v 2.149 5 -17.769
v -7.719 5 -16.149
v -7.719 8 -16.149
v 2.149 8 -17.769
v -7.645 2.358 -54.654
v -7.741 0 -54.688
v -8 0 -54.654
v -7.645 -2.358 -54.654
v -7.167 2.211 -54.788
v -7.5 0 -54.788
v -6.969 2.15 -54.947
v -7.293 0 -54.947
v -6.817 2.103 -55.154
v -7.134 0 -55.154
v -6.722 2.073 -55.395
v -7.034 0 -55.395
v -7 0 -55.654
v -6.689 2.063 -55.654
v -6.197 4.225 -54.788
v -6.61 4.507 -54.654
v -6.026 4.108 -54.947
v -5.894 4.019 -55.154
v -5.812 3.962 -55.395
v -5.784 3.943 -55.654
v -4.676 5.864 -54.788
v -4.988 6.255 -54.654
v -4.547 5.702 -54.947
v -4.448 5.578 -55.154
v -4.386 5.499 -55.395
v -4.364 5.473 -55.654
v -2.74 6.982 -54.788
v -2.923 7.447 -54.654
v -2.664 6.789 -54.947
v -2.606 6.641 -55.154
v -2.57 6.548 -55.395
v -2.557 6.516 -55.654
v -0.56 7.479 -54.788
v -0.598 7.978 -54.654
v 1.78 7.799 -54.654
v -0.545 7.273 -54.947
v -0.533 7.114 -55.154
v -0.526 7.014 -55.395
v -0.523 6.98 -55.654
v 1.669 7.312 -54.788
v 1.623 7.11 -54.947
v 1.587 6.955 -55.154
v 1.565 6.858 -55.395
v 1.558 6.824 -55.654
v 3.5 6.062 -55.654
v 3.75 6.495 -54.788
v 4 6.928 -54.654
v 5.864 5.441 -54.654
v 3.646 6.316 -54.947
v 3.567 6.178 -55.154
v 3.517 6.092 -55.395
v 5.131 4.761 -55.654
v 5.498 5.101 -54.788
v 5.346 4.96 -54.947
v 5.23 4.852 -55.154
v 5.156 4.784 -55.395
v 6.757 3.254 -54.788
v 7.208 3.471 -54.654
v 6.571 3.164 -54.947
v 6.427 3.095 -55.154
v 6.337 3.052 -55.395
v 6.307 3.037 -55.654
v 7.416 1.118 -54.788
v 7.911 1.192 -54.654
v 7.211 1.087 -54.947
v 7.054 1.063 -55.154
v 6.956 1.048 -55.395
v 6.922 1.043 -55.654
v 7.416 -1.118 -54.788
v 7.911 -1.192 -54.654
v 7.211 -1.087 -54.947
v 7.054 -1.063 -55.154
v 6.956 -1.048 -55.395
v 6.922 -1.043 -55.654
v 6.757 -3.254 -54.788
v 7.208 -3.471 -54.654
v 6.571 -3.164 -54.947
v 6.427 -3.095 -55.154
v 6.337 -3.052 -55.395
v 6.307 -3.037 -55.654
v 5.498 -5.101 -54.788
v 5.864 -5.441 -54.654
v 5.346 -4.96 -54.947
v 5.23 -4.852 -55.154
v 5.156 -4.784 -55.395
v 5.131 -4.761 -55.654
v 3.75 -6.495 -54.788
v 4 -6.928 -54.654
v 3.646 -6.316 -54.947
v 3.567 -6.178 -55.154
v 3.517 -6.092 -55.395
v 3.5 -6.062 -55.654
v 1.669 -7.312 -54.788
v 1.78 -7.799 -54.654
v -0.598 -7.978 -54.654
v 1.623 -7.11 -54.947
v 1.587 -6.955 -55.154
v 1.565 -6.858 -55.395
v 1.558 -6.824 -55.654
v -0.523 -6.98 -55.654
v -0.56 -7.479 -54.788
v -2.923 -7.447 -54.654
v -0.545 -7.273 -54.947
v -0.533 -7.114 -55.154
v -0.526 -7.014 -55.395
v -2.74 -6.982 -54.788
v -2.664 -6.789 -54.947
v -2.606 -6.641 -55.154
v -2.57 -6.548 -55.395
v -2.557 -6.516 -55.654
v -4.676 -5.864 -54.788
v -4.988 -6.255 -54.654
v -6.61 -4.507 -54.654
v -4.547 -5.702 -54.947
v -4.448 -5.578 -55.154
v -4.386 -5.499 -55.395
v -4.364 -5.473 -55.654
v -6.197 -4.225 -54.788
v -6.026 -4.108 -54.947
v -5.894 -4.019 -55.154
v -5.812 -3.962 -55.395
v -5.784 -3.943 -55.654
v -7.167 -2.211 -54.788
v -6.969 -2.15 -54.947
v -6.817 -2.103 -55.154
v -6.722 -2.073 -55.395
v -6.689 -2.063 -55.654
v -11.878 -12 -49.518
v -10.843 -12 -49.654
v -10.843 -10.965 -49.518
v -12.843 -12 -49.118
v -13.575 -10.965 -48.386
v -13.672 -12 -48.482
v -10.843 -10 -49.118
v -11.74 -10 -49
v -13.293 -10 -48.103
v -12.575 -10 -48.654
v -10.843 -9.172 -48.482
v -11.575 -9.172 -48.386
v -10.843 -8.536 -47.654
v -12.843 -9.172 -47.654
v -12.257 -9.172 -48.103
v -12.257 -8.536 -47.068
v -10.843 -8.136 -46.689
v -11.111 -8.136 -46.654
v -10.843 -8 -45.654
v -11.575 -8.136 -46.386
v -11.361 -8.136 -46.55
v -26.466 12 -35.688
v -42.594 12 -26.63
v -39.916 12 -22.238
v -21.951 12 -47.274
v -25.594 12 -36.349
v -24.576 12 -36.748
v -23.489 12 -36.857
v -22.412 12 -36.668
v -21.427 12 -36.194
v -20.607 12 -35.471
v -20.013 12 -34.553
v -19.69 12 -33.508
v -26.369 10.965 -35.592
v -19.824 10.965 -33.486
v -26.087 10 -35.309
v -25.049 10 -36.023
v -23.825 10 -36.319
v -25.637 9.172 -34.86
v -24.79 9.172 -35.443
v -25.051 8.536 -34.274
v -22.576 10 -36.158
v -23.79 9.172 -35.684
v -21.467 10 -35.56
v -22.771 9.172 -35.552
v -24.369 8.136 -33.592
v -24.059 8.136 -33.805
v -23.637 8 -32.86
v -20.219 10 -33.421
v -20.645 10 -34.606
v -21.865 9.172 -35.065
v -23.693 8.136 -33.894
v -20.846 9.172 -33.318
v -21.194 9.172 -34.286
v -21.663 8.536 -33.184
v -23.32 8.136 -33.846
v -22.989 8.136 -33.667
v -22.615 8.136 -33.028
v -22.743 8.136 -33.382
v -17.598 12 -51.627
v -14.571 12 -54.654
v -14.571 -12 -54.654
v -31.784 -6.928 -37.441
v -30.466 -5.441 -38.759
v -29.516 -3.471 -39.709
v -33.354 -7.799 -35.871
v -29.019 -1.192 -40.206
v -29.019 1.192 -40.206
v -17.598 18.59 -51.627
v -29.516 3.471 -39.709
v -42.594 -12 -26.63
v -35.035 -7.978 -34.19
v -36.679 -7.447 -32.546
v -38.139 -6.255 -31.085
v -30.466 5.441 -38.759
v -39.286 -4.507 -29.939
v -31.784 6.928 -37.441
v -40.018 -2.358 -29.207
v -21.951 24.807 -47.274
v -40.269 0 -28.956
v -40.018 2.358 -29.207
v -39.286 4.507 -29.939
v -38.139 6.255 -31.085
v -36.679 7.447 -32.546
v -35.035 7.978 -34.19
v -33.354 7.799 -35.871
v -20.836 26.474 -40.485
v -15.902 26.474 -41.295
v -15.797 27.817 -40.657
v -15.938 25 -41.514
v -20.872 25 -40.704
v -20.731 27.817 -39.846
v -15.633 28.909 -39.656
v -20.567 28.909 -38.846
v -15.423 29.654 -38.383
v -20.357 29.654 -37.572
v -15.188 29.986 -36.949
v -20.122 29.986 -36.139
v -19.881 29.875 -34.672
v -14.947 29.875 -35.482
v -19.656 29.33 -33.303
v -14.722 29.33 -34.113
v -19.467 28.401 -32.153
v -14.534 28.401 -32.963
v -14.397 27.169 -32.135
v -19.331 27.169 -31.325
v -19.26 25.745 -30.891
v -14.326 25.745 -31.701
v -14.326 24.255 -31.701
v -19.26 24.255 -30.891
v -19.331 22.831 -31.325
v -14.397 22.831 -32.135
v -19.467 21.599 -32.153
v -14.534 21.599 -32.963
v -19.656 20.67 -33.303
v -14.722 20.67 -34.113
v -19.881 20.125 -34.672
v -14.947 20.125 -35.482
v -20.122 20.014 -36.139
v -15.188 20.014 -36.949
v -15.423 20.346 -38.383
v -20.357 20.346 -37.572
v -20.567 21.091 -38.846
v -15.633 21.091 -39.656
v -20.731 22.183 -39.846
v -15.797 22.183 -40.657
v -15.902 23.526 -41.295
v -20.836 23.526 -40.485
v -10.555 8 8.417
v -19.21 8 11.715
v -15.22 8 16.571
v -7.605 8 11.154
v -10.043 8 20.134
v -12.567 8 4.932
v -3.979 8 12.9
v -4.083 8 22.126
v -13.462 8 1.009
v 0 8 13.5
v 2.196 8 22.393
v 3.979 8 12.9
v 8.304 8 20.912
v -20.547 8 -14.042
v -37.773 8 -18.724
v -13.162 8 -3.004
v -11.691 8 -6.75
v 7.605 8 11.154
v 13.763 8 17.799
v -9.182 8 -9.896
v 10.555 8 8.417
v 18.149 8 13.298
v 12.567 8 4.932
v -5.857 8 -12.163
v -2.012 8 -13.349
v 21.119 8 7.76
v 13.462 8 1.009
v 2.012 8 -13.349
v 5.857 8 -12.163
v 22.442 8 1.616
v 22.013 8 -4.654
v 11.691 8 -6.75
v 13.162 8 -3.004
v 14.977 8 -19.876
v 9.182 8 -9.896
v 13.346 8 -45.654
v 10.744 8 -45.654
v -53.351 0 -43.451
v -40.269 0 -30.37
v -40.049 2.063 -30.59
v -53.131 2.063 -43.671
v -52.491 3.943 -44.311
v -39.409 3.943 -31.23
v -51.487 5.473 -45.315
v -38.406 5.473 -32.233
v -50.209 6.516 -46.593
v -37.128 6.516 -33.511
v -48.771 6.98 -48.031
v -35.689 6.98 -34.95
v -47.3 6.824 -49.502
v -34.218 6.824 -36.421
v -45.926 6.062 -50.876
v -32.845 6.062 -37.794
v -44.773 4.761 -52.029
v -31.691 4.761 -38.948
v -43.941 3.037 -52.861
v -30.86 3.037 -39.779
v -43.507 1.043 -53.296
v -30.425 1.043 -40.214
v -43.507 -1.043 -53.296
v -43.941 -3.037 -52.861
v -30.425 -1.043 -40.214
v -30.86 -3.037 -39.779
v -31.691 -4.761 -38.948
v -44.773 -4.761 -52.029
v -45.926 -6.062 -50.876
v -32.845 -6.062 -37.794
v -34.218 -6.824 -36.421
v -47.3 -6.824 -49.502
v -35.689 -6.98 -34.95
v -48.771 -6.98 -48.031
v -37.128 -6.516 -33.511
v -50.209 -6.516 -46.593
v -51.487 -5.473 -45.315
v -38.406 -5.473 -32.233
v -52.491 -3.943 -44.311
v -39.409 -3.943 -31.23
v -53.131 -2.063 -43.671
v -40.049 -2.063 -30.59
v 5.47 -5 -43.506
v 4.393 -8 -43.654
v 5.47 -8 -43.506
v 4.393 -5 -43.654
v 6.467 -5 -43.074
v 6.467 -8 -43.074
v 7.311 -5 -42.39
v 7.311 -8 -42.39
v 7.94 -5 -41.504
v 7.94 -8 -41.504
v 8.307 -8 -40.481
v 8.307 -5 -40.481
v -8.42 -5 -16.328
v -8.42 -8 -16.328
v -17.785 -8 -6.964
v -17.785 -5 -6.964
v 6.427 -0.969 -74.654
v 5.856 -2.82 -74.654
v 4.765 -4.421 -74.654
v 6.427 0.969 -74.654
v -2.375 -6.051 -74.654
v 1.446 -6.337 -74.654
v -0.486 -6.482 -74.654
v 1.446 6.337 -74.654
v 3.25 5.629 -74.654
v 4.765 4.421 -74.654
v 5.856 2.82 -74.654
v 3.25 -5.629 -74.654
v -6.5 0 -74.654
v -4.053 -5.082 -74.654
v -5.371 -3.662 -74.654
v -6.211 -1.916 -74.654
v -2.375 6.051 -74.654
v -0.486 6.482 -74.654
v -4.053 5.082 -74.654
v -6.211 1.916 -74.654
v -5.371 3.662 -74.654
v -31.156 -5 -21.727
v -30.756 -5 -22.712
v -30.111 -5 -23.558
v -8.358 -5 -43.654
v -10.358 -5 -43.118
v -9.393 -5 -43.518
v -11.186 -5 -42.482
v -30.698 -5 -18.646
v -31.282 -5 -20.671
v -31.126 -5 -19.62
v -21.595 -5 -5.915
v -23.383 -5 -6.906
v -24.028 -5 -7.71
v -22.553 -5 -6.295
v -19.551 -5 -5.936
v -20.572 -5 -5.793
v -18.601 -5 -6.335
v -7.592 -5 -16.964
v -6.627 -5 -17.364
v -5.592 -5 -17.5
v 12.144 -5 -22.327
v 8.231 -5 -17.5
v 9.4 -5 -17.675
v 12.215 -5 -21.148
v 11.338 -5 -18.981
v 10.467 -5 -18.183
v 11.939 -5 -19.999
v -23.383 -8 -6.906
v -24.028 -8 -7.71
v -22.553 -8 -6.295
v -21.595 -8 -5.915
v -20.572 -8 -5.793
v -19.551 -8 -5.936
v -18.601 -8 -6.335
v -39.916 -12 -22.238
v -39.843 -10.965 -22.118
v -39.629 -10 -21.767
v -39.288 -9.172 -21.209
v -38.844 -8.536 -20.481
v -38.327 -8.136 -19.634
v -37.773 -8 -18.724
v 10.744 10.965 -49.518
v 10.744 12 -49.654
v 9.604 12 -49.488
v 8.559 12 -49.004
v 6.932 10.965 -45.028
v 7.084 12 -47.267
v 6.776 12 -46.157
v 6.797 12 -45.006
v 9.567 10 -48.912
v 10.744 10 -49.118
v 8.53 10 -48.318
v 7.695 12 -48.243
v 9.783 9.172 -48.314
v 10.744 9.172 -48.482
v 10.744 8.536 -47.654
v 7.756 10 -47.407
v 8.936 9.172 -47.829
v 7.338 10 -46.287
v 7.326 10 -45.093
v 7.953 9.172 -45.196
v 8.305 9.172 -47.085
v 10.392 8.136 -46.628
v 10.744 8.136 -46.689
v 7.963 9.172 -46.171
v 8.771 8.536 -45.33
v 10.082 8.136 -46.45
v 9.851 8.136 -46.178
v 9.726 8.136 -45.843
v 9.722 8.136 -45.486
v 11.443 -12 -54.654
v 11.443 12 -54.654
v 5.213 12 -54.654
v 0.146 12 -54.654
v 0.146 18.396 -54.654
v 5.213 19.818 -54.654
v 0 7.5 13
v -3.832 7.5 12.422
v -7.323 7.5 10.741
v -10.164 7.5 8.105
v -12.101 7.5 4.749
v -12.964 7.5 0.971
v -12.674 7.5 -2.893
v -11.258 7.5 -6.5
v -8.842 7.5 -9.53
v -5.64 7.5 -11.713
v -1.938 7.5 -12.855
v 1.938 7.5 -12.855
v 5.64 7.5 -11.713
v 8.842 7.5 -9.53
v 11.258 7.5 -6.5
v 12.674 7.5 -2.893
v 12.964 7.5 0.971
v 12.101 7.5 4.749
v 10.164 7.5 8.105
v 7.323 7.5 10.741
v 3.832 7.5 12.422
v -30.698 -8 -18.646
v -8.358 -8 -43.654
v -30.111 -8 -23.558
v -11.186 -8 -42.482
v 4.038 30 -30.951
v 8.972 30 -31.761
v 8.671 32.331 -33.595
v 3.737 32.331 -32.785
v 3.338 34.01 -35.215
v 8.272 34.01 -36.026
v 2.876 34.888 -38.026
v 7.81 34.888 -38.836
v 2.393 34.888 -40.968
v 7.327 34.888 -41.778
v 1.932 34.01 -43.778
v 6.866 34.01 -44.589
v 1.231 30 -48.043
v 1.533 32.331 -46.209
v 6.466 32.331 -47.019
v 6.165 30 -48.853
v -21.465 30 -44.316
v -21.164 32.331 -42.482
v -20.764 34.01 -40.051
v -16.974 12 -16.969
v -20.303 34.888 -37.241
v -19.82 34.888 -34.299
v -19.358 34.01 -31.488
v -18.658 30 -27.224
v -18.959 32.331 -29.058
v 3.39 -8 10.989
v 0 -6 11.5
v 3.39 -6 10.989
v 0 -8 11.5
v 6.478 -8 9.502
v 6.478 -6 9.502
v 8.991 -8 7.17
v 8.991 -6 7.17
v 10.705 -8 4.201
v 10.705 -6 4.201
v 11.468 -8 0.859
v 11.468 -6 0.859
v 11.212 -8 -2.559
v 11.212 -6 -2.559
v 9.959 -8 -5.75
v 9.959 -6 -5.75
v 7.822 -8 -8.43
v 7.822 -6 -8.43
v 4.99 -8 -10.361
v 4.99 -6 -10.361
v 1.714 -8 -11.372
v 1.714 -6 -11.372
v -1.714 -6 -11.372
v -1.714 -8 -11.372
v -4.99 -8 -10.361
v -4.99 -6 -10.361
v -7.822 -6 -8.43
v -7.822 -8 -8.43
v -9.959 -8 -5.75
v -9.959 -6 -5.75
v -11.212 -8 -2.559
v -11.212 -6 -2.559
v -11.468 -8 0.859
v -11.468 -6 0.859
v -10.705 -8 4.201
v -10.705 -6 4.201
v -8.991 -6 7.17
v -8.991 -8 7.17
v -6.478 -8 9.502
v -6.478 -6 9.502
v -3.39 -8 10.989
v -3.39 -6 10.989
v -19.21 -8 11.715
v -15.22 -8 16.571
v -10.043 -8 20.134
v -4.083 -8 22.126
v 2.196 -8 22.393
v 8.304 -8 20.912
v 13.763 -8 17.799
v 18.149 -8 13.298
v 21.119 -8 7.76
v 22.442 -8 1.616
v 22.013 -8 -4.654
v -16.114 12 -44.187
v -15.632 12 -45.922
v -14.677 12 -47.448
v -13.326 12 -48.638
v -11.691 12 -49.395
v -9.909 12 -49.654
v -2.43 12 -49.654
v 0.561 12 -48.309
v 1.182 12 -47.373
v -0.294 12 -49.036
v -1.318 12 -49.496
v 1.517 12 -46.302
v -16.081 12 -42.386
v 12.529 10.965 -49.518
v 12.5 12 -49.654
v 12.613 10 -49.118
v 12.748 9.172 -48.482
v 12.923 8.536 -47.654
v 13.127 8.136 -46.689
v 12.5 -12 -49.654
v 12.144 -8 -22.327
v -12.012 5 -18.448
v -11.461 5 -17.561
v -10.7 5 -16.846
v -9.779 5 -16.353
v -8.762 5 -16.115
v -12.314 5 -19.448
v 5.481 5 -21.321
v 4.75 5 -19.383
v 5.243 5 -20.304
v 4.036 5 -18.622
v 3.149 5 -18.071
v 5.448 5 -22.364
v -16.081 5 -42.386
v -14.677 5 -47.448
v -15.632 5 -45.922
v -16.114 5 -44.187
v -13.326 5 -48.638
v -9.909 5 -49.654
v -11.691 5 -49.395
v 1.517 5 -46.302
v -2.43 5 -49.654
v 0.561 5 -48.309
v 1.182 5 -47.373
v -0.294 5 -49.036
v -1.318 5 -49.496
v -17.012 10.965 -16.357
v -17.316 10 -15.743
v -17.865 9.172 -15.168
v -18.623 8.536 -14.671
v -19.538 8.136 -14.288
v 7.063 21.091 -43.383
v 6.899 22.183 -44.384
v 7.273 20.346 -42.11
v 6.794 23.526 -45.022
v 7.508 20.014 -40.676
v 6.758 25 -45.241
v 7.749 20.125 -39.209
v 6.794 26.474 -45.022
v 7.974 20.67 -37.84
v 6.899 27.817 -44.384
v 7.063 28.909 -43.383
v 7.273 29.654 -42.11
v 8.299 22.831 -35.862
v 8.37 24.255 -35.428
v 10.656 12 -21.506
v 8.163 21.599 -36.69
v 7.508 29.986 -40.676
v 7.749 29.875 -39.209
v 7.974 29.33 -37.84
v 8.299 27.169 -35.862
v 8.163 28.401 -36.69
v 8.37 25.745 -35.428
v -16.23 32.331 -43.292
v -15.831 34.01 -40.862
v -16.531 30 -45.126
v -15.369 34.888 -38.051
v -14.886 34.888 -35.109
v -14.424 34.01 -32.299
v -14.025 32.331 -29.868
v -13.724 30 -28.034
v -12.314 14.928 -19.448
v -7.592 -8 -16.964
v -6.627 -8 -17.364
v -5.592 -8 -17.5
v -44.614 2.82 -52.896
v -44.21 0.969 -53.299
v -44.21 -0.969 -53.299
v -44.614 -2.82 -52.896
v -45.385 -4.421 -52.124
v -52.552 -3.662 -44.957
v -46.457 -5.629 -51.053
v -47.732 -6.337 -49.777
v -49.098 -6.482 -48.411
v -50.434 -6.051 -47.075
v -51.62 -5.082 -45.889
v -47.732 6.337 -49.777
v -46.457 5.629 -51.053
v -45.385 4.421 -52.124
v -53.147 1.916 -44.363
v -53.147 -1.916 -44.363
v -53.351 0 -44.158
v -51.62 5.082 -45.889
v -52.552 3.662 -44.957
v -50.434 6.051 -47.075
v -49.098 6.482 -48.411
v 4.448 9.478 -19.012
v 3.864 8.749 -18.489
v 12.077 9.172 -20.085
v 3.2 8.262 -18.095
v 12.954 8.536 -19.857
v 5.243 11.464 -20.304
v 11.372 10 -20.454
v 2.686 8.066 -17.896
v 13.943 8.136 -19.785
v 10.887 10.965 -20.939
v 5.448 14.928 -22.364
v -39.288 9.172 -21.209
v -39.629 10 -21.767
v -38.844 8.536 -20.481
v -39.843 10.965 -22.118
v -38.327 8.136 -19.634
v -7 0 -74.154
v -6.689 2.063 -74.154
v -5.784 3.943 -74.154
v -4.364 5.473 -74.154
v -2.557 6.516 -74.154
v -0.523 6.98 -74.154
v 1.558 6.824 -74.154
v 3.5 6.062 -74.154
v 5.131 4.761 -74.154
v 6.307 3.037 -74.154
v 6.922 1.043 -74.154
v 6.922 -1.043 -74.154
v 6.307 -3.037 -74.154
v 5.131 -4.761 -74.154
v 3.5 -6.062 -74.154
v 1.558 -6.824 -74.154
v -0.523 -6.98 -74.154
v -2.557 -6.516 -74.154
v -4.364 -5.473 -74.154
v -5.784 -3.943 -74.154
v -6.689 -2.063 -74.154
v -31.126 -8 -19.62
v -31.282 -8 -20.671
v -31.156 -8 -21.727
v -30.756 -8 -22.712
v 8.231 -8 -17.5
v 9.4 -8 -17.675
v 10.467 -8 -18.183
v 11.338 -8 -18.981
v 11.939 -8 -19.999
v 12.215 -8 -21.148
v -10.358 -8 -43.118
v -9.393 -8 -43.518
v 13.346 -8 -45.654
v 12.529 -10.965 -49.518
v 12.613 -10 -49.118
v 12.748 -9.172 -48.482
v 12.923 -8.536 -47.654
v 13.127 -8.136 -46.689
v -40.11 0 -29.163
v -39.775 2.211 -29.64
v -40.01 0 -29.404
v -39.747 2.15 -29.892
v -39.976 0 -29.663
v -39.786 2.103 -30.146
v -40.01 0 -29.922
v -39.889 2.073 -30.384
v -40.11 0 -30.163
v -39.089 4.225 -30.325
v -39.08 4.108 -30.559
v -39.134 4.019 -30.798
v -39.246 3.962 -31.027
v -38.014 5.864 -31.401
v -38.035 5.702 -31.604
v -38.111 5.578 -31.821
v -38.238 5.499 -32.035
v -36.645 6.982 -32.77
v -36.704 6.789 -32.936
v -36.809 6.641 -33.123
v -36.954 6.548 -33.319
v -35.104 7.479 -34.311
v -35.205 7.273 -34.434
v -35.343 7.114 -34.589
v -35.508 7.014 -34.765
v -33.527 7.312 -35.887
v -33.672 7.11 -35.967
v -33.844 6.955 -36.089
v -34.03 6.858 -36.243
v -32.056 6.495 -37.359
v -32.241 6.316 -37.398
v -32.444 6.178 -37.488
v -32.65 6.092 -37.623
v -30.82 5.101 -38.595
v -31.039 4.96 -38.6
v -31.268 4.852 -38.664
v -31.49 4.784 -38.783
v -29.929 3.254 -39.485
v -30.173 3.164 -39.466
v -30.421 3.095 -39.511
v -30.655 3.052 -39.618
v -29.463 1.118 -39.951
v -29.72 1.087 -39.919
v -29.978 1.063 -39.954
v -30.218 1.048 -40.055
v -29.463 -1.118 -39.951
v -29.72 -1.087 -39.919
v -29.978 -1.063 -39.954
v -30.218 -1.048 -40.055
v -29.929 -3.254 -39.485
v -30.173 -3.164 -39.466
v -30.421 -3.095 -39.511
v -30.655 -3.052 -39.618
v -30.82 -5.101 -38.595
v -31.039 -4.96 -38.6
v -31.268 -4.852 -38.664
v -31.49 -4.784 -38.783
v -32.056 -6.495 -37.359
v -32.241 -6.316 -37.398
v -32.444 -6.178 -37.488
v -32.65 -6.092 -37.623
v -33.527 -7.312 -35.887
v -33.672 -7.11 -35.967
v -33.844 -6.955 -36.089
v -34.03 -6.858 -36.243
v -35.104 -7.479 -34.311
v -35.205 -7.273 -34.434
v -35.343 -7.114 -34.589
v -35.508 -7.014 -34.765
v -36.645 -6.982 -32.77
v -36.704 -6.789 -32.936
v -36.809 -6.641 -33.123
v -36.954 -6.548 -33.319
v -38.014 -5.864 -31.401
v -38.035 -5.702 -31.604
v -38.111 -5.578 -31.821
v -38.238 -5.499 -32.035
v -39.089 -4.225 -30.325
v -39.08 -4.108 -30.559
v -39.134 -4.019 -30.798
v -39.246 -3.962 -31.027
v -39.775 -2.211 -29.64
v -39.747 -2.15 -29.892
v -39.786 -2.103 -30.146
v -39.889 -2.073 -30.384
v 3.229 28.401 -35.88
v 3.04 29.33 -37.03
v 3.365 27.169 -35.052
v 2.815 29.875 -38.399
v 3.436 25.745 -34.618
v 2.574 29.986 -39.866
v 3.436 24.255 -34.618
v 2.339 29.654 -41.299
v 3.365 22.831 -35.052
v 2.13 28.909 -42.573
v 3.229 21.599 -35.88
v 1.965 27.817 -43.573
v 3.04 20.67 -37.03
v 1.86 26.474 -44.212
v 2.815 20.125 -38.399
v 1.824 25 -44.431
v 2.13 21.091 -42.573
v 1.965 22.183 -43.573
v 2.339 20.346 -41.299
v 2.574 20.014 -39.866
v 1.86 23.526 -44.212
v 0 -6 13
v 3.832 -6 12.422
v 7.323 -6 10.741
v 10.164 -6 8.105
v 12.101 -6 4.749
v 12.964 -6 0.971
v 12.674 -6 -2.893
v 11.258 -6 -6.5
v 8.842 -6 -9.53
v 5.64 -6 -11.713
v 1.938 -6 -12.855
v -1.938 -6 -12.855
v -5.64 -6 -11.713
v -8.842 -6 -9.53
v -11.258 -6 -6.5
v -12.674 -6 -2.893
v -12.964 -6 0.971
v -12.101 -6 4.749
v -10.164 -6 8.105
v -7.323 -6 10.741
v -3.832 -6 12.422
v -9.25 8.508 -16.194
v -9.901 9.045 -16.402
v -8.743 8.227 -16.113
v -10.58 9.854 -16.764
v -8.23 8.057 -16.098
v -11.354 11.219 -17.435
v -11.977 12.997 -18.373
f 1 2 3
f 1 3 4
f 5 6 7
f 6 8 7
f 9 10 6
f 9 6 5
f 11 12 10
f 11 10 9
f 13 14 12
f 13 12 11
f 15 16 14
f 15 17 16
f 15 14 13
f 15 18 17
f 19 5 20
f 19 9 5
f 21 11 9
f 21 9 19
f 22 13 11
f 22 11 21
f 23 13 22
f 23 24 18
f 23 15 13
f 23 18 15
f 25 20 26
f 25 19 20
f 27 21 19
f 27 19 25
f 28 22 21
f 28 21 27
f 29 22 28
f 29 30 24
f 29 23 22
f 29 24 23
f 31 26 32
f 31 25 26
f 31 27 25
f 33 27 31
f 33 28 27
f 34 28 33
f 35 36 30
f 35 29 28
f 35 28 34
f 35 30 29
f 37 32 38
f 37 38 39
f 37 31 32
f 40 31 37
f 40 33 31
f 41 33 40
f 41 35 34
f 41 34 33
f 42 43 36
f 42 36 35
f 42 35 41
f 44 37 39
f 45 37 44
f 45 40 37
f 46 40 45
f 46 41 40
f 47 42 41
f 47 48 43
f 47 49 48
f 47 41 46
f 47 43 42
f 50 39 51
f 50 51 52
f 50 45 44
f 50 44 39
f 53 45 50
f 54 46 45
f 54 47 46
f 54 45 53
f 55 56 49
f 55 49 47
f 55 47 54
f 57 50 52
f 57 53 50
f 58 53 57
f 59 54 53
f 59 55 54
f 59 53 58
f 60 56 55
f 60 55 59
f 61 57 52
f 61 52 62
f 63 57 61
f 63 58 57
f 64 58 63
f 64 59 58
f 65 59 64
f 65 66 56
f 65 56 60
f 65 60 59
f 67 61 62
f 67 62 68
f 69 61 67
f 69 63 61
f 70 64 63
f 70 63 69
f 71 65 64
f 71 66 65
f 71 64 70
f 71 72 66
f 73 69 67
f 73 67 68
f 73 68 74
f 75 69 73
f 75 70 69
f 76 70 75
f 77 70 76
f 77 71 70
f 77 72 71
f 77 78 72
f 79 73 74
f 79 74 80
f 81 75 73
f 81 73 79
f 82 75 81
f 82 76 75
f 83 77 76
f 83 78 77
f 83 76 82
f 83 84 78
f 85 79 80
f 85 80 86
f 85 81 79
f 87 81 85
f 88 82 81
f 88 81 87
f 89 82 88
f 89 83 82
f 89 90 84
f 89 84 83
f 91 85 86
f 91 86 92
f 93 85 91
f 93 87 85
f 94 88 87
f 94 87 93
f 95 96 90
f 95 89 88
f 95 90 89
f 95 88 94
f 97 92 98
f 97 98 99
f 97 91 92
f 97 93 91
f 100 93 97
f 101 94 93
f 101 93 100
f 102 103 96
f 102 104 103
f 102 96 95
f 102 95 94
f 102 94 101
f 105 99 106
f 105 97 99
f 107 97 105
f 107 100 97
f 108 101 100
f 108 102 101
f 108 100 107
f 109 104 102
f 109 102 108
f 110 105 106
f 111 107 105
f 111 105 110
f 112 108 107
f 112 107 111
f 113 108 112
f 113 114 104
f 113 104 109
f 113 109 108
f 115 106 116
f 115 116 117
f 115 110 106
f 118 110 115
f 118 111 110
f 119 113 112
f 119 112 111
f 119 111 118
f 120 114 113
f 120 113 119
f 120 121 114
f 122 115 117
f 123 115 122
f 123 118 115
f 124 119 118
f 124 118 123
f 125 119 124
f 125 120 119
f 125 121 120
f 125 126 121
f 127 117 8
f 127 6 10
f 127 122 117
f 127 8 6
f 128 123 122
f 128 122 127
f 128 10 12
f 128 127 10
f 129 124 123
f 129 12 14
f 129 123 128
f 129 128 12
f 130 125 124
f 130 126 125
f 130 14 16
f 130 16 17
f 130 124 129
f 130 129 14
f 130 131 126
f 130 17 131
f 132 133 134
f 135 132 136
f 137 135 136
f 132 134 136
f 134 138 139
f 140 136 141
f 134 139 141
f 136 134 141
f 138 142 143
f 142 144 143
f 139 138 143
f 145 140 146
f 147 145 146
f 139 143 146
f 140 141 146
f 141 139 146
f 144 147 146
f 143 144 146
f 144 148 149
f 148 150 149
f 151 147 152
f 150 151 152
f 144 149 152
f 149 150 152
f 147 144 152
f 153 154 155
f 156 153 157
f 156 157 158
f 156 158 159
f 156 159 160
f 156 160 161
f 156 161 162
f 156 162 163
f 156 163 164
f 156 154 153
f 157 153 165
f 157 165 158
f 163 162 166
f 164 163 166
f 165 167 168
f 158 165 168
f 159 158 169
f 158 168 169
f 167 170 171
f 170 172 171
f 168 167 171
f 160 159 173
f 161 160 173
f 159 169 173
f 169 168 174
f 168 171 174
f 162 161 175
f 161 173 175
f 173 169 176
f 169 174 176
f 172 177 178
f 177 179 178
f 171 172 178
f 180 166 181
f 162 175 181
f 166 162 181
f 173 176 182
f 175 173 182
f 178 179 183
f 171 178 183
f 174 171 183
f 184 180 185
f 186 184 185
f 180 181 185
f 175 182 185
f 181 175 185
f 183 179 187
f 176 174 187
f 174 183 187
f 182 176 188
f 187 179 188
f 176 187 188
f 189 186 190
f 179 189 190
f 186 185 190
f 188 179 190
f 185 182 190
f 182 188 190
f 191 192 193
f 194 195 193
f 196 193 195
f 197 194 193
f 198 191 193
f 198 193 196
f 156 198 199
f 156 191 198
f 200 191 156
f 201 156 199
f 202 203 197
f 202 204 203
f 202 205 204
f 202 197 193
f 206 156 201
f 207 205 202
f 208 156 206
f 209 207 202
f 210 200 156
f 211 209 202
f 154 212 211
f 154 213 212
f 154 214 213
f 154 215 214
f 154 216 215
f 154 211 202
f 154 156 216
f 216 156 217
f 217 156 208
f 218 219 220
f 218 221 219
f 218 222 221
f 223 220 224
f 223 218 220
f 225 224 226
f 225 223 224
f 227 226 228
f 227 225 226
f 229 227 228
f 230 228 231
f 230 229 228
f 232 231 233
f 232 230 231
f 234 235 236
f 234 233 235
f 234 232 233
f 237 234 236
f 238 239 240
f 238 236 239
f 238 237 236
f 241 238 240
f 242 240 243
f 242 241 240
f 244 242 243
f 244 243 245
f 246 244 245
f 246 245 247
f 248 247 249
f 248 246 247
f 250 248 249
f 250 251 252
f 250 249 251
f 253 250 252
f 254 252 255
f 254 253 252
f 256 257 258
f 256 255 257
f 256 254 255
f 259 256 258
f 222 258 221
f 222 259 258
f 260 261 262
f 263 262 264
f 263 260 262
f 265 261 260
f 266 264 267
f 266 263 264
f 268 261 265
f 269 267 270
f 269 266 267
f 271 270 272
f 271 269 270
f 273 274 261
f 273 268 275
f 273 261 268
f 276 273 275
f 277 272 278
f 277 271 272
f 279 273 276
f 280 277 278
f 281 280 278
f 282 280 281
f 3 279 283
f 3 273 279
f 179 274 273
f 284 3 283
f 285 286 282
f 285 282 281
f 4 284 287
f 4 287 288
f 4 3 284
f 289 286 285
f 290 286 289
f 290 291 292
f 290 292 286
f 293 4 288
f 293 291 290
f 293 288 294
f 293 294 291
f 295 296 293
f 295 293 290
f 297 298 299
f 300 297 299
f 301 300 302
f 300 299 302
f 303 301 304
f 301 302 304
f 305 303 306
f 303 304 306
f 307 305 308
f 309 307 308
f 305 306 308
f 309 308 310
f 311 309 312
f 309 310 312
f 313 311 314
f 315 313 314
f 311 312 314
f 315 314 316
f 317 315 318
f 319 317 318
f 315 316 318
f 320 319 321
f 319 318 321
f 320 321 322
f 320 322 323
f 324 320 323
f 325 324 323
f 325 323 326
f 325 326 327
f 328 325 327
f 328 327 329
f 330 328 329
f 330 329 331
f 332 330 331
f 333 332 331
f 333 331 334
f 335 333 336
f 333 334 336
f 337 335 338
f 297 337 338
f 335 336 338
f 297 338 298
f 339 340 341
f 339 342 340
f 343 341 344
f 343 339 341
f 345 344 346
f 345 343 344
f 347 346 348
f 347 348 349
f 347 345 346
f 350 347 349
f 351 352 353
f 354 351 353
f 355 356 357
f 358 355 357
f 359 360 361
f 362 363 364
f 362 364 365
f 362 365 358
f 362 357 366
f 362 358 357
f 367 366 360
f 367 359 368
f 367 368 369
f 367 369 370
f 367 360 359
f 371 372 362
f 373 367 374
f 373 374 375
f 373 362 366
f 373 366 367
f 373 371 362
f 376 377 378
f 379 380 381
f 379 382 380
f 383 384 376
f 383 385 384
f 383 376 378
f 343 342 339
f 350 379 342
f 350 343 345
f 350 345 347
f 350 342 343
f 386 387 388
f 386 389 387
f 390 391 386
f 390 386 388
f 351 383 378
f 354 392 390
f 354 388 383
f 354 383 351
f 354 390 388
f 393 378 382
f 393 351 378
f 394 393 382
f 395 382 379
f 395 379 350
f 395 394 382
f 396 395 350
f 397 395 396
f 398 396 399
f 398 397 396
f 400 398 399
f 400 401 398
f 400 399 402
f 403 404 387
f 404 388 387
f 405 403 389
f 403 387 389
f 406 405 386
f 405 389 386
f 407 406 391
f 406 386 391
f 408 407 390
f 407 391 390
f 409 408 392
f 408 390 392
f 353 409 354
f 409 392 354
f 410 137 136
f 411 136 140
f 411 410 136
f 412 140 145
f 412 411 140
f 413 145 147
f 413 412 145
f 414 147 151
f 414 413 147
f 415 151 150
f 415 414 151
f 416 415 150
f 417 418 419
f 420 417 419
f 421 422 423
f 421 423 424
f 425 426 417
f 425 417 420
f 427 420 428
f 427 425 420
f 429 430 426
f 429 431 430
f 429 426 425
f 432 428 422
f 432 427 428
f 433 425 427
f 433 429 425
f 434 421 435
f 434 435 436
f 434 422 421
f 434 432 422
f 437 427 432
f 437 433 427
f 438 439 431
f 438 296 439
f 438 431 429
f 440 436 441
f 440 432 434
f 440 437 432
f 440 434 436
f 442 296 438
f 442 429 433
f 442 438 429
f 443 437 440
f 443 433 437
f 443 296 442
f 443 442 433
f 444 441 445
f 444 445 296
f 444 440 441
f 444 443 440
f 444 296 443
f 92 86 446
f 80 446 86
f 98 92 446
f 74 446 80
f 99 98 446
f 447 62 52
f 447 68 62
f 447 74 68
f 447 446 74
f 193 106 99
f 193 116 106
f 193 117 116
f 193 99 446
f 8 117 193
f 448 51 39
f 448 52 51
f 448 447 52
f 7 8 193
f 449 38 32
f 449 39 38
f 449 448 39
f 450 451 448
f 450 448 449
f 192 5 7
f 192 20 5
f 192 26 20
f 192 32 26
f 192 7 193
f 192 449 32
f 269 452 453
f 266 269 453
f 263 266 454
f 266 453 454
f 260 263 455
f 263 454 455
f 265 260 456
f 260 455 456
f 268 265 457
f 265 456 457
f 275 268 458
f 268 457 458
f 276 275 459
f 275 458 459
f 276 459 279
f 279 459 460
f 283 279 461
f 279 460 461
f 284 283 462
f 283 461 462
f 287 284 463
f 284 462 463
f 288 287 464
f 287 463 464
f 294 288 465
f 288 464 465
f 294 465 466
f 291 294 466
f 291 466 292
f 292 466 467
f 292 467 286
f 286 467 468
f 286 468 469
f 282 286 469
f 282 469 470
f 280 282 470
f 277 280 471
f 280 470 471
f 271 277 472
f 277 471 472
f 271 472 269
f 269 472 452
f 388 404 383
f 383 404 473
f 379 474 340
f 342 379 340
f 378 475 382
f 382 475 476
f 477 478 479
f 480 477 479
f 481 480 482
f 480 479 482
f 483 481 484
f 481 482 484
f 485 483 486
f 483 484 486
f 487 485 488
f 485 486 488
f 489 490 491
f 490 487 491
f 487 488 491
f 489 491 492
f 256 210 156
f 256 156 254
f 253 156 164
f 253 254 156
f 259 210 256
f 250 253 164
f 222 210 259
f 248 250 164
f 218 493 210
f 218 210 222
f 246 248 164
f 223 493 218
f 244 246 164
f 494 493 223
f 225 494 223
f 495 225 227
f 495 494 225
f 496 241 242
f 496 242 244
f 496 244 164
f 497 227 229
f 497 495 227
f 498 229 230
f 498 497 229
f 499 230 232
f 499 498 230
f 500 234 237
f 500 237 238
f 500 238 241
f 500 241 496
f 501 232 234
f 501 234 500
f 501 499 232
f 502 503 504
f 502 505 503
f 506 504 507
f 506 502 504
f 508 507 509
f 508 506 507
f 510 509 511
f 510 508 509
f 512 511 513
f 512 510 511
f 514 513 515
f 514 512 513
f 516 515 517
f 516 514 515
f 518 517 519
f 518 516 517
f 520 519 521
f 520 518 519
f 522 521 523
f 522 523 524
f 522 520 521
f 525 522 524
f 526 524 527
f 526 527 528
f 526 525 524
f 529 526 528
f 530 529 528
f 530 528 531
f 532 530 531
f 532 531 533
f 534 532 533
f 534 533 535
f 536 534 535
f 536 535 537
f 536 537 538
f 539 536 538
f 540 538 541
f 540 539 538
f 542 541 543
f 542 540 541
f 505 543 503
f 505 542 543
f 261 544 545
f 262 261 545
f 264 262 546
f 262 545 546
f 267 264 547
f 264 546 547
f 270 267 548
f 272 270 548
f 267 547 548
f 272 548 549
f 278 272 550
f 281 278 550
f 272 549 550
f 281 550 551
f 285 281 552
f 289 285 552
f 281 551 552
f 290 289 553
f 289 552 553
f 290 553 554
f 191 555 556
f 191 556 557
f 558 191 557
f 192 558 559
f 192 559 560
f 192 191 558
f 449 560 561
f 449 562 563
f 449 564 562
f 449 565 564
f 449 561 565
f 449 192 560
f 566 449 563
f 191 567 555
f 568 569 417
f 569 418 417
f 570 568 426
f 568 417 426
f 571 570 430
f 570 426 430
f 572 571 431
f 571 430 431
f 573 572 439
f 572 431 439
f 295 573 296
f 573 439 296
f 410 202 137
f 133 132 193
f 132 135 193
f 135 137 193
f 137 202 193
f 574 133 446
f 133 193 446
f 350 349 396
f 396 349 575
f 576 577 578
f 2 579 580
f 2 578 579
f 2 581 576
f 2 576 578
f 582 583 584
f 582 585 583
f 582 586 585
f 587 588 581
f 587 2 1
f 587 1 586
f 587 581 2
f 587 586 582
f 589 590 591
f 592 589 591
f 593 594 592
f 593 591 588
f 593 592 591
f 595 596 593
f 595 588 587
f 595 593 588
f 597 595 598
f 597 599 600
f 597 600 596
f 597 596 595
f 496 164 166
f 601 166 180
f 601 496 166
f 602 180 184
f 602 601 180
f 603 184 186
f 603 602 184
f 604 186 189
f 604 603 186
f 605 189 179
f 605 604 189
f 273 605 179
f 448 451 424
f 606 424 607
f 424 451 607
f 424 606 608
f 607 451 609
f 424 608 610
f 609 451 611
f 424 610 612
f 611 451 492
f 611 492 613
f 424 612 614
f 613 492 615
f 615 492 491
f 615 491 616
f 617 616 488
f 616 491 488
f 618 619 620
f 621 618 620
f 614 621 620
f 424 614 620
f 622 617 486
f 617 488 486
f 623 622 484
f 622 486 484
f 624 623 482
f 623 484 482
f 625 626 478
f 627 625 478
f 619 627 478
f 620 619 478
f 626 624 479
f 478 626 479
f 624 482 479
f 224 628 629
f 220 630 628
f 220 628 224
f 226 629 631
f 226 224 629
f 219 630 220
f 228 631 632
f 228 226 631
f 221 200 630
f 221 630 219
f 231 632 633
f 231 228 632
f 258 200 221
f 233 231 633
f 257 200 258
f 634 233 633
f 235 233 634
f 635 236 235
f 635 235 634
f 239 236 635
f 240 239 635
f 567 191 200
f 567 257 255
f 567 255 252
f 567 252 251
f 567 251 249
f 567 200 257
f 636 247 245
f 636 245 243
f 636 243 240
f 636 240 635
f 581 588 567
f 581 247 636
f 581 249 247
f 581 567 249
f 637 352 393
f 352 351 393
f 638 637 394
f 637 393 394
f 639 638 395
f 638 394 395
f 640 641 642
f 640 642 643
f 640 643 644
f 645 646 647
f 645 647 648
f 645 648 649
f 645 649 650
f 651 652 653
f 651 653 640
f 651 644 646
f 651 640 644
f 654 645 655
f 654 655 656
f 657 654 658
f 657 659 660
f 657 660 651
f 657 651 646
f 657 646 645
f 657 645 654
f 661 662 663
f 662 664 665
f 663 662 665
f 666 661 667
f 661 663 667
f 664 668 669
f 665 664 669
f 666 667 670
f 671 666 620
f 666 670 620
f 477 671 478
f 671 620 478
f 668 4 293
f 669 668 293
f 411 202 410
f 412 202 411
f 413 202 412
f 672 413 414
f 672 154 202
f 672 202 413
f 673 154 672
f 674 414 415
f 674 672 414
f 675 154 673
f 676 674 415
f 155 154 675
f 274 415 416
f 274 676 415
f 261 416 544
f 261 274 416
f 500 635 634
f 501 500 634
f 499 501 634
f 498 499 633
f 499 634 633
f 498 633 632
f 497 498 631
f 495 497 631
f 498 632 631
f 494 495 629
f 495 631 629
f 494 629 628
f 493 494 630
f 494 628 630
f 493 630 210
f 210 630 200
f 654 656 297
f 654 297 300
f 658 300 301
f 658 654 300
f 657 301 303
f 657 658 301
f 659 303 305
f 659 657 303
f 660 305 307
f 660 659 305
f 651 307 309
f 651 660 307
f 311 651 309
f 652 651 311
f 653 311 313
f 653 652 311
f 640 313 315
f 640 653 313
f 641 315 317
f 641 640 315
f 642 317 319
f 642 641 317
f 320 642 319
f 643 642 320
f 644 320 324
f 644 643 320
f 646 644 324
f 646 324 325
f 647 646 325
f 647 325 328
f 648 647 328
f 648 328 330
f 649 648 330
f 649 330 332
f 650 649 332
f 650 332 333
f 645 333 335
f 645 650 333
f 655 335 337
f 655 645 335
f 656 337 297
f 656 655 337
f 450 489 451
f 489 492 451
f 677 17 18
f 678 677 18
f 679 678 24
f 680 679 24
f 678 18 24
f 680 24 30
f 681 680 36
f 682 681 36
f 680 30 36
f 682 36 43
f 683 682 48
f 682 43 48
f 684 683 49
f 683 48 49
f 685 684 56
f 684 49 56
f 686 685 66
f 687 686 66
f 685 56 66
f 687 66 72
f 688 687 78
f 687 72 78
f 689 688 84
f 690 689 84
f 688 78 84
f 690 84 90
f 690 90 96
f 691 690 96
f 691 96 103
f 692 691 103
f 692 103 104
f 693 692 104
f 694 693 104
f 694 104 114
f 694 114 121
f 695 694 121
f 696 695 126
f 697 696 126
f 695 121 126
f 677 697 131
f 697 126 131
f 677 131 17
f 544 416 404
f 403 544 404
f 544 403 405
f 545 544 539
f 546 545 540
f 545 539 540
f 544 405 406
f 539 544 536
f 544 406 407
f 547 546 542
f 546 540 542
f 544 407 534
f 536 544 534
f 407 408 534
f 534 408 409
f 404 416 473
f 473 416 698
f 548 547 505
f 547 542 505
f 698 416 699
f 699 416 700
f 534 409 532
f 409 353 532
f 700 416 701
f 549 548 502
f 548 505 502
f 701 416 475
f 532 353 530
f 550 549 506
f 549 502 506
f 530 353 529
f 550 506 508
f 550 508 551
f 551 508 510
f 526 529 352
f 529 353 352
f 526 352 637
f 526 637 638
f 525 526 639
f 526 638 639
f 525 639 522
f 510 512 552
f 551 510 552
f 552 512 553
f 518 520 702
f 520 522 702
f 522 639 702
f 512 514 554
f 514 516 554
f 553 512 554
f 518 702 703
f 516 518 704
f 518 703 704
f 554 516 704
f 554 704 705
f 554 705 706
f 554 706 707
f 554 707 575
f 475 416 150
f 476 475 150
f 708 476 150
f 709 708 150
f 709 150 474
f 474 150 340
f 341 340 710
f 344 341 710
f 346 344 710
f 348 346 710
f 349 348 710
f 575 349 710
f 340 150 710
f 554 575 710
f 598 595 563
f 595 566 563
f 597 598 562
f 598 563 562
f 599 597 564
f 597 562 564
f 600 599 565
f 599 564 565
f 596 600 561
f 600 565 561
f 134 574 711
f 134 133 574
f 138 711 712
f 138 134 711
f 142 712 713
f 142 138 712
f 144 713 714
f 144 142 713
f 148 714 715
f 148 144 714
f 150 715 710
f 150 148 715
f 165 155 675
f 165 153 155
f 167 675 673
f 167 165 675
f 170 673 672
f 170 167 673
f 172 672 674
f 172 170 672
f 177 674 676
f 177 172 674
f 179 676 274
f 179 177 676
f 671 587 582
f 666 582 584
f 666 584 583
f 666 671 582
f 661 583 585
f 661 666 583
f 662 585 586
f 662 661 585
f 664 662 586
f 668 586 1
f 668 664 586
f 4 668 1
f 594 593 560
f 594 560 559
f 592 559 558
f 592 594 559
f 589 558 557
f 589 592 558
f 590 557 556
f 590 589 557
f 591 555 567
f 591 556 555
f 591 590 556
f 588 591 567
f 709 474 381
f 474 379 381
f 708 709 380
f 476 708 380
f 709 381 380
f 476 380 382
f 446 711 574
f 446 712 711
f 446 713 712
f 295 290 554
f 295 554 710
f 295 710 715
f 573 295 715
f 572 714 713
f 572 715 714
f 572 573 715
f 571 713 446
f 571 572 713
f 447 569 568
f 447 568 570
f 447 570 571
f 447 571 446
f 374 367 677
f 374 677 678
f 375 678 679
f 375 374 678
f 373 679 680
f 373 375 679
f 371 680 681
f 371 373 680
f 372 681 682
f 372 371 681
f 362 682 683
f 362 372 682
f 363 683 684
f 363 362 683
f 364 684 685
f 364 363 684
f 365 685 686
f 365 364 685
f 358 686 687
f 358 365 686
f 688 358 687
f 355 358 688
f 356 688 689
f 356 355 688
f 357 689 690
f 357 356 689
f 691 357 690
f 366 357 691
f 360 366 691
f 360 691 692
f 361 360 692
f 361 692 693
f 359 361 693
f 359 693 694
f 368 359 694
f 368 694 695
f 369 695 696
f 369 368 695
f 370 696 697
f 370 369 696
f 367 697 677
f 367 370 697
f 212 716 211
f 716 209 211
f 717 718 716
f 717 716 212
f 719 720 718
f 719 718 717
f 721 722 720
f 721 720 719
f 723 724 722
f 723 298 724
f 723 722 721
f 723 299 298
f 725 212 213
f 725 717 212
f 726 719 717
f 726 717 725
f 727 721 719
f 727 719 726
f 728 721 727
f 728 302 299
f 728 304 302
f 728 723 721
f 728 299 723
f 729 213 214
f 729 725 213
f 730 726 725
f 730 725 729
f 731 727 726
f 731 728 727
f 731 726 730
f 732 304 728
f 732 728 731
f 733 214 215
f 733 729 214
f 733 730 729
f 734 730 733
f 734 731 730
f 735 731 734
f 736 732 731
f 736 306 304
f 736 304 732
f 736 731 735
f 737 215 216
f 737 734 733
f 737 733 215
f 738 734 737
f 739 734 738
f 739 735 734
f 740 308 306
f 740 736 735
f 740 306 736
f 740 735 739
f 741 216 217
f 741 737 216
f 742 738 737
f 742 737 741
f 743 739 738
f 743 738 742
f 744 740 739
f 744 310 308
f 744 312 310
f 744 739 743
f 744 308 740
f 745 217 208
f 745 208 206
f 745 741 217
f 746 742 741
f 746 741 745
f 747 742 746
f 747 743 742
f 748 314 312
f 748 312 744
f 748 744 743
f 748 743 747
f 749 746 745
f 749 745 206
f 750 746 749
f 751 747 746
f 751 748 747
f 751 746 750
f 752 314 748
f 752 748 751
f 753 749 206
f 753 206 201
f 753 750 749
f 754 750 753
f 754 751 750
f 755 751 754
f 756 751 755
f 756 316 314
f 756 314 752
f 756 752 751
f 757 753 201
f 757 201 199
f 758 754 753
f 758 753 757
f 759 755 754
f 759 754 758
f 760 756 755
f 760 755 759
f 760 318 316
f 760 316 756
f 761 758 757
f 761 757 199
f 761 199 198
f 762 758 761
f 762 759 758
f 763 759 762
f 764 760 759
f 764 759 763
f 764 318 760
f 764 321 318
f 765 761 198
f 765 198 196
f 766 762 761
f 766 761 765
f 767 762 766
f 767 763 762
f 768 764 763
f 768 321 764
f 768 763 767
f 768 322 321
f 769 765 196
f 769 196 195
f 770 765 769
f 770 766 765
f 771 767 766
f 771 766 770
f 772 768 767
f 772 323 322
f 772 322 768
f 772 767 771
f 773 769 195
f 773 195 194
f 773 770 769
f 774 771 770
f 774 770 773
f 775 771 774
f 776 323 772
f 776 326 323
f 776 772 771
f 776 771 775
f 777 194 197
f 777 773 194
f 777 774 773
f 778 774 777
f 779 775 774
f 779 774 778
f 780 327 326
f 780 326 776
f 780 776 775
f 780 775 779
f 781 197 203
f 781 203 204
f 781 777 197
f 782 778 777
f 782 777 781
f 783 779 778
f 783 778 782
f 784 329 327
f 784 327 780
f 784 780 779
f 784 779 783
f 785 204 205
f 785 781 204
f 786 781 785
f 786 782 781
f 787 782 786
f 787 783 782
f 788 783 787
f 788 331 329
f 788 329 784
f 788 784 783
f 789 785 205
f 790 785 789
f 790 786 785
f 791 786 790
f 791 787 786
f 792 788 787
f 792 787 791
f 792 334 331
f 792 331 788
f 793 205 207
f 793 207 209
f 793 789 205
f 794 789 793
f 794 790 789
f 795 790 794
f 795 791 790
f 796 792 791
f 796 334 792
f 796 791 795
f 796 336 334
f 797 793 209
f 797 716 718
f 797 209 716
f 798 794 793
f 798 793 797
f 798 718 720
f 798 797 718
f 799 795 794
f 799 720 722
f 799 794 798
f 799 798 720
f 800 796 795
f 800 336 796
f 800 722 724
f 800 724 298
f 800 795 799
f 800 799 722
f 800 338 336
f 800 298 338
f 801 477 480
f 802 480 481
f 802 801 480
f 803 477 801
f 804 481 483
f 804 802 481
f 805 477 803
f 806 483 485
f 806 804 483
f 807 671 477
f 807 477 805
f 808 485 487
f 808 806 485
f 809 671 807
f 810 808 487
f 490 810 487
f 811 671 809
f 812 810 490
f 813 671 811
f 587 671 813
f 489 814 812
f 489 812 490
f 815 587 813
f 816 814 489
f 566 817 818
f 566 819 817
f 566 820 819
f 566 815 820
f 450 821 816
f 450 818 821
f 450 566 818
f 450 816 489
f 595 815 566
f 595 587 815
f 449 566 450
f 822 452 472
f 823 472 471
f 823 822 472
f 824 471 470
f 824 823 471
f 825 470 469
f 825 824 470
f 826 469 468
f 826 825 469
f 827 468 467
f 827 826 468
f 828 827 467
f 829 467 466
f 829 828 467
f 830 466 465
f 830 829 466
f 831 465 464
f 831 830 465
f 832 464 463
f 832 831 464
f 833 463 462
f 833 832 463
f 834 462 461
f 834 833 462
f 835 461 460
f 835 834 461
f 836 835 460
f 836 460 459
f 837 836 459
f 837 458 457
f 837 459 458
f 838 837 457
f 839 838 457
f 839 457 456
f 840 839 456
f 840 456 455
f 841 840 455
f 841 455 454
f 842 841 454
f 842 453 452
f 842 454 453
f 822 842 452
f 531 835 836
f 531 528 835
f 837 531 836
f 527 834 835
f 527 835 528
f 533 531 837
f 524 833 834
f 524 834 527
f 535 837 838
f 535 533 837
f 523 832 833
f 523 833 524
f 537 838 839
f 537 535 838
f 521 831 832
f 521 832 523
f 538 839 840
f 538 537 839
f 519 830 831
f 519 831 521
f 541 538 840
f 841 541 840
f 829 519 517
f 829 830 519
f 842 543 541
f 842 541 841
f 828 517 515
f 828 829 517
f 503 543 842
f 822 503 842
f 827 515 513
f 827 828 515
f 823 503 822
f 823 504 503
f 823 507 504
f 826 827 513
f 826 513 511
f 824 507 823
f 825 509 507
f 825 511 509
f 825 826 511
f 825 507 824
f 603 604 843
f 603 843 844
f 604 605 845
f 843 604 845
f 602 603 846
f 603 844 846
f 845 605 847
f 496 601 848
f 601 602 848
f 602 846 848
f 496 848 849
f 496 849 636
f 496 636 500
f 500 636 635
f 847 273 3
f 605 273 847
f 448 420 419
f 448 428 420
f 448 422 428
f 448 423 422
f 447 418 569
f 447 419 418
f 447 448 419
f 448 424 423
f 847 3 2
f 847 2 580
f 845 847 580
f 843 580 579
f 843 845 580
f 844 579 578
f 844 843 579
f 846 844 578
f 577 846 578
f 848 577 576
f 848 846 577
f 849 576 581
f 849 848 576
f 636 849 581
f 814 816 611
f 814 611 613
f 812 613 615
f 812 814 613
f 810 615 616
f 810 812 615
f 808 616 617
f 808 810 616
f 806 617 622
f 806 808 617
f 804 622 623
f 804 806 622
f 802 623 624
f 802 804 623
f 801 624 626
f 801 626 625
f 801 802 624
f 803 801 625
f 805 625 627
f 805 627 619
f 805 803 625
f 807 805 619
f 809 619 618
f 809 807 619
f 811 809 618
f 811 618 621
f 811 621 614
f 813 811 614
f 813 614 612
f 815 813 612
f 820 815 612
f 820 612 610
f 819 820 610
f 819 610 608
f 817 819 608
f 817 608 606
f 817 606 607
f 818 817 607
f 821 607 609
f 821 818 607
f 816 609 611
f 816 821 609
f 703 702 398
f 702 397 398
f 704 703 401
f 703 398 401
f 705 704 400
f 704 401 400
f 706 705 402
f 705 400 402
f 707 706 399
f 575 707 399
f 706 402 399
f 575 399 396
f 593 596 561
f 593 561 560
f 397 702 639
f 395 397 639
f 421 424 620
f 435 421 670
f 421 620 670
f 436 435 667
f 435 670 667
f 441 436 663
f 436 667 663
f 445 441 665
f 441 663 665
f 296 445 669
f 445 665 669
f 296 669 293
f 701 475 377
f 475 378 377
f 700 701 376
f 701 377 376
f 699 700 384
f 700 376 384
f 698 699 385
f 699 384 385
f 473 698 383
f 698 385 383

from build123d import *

# Parameters (mm, degrees)
SZKIC1_R                        = 13
SZKIC1_R_2                      = 11.5
DODANIE_WYCI_GNI_CIE1_DEPTH     = 8
SZKIC2_R                        = 5.0000000000000036
DODANIE_WYCI_GNI_CIE2_DEPTH     = 14
DODANIE_WYCI_GNI_CIE3_DEPTH     = 12
WYTNIJ_WYCI_GNI_CIE1_DEPTH      = 81.41142519817177
WYTNIJ_WYCI_GNI_CIE1_DEPTH_BACK = 6
SZKIC1_3_R                      = 13
SZKIC1_3_R_2                    = 11.5
WYTNIJ_WYCI_GNI_CIE2_DEPTH      = 78.26575763170368
WYTNIJ_WYCI_GNI_CIE2_DEPTH_BACK = 3
WYTNIJ_WYCI_GNI_CIE3_START      = 4
WYTNIJ_WYCI_GNI_CIE3_DEPTH      = 74.265757666648
WYTNIJ_WYCI_GNI_CIE4_DEPTH      = 78.26575763170368
SZKIC4_R                        = 7
DODANIE_WYCI_GNI_CIE4_DEPTH     = 20
SZKIC5_R                        = 7
DODANIE_WYCI_GNI_CIE5_DEPTH     = 20
WYTNIJ_WYCI_GNI_CIE5_DEPTH      = 3
ZAOKR_GLENIE1_R                 = 4
ZAOKR_GLENIE2_R                 = 4
ZAOKR_GLENIE3_R                 = 1
SFAZOWANIE1_SIZE                = 0.5


with BuildPart() as part:
    # Szkic1 → Dodanie-wyciągnięcie1 (new, symmetric)
    # profile 1 of 2: a face of its own
    with BuildSketch(Plane(origin=(0, 0, 0), x_dir=(1, 0, 0), z_dir=(0, 1, 0))):
        with BuildLine():
            Line((-39.9157635445463, 22.238094014882595), (-19.20964530804123, -11.714927534528307))
            ThreePointArc((-19.20964530804123, -11.714927534528307), (8.303589569253562, -20.911728772757726), (22.01344157137967, 4.653857559428904))
            Line((22.01344157137967, 4.653857559428904), (12.499999999999995, 49.6538575594289))
            Line((12.499999999999995, 49.6538575594289), (-12.499999999999995, 49.6538575594289))
            Line((-12.499999999999995, 49.6538575594289), (-39.9157635445463, 22.238094014882595))
        make_face()
        Circle(SZKIC1_R, mode=Mode.SUBTRACT)
    # profile 2 of 2: a face of its own
    with BuildSketch(Plane(origin=(0, 0, 0), x_dir=(1, 0, 0), z_dir=(0, 1, 0))):
        Circle(SZKIC1_R)
        with Locations(Location((0, 0, 0), (0, 0, 270))):
            Circle(SZKIC1_R_2, mode=Mode.SUBTRACT)
    extrude(amount=DODANIE_WYCI_GNI_CIE1_DEPTH, both=True)

    # Szkic2 → Dodanie-wyciągnięcie2 (add, symmetric)
    with BuildSketch(Plane(origin=(0, 0, 0), x_dir=(-0.16204203158770583, 0, -0.9867838567786408), z_dir=(0.9867838567786409, 0, -0.16204203158770586))):
        with BuildLine():
            Line((17.185981887192586, 8), (29.887687809364394, 30.00000000000001))
            ThreePointArc((29.887687809364394, 30.00000000000001), (38.54794184720877, 35), (47.20819588505315, 30.000000000000014))
            Line((47.20819588505315, 30.000000000000014), (57.02315046127683, 13.000000000000002))
            Line((57.02315046127683, 13.000000000000002), (57.02315046127683, 8))
            Line((57.02315046127683, 8), (17.185981887192586, 8))
        make_face()
        with Locations((38.54794184720877, 25)):
            Circle(SZKIC2_R, mode=Mode.SUBTRACT)
    extrude(amount=DODANIE_WYCI_GNI_CIE2_DEPTH, both=True)

    # Szkic1<5> → Dodanie-wyciągnięcie3 (add, symmetric)
    with BuildSketch(Plane(origin=(0, 0, 0), x_dir=(1, 0, 0), z_dir=(0, 1, 0))):
        Polygon((-12.499999999999995, 49.6538575594289), (12.499999999999995, 49.6538575594289), (11.442950936513364, 54.6538575594289), (-14.571067811865477, 54.6538575594289), (-42.59444393988905, 26.630481431405318), (-39.9157635445463, 22.238094014882595), align=None)
    extrude(amount=DODANIE_WYCI_GNI_CIE3_DEPTH, both=True)

    # Szkic1<3> → Wytnij-wyciągnięcie1 (cut, two sides: drawn at the far end of the back side and taken through both)
    with BuildSketch(Plane(origin=(0, 0, 0), x_dir=(1, 0, 0), z_dir=(0, 1, 0)).offset(-WYTNIJ_WYCI_GNI_CIE1_DEPTH_BACK)):
        with Locations(Location((0, 0, 0), (0, 0, 270))):
            Circle(SZKIC1_3_R)
        with Locations(Location((0, 0, 0), (0, 0, 270))):
            Circle(SZKIC1_3_R_2, mode=Mode.SUBTRACT)
    extrude(amount=WYTNIJ_WYCI_GNI_CIE1_DEPTH + WYTNIJ_WYCI_GNI_CIE1_DEPTH_BACK, mode=Mode.SUBTRACT)

    # Szkic3 → Wytnij-wyciągnięcie2 (cut, two sides: drawn at the far end of the back side and taken through both)
    with BuildSketch(Plane(origin=(0, 8, 0), x_dir=(1, 0, 0), z_dir=(0, 1, 0)).offset(-WYTNIJ_WYCI_GNI_CIE2_DEPTH_BACK)):
        with BuildLine():
            Line((-16.080898850750692, 42.386356929210905), (-11.665906130837973, 15.500471204882405))
            Line((-11.665906130837973, 15.500471204882405), (6.096203291177561, 18.417227773461114))
            Line((6.096203291177559, 18.417227773461114), (0.9667649489300167, 49.6538575594289))
            Line((0.9667649489300163, 49.6538575594289), (-9.9094763840183, 49.6538575594289))
            ThreePointArc((-9.9094763840183, 49.6538575594289), (-14.676630164659013, 47.44795607994614), (-16.080898850750696, 42.386356929210905))
        make_face()
    extrude(amount=WYTNIJ_WYCI_GNI_CIE2_DEPTH + WYTNIJ_WYCI_GNI_CIE2_DEPTH_BACK, mode=Mode.SUBTRACT)

    # Szkic3<3> → Wytnij-wyciągnięcie3 (cut, through all)
    with BuildSketch(Plane(origin=(0, 8, 0), x_dir=(1, 0, 0), z_dir=(0, 1, 0)).offset(WYTNIJ_WYCI_GNI_CIE3_START)):
        with BuildLine():
            ThreePointArc((-16.080898850750696, 42.386356929210905), (-14.676630164659013, 47.44795607994614), (-9.9094763840183, 49.6538575594289))
            Line((-9.9094763840183, 49.6538575594289), (0.9667649489300167, 49.6538575594289))
            Line((0.9667649489300163, 49.6538575594289), (0.14570352562758648, 54.6538575594289))
            Line((0.14570352562758646, 54.6538575594289), (-14.571067811865477, 54.65385755942889))
            Line((-14.571067811865477, 54.65385755942889), (-17.59826945789091, 51.626655913403454))
            Line((-17.59826945789091, 51.626655913403454), (-16.080898850750696, 42.386356929210905))
        make_face()
    extrude(amount=WYTNIJ_WYCI_GNI_CIE3_DEPTH, mode=Mode.SUBTRACT)

    # Szkic3<4> → Wytnij-wyciągnięcie4 (cut, through all)
    with BuildSketch(Plane(origin=(0, 8, 0), x_dir=(1, 0, 0), z_dir=(0, 1, 0))):
        Polygon((-9.240147148276744, 56.26952433784747), (-8.97483481534258, 54.65385755942888), (0.14570352562758693, 54.6538575594289), (5.212669270611022, 54.6538575594289), (4.5748268466242505, 58.53811278007535), align=None)
        Polygon((-14.571067811865477, 54.65385755942889), (-8.974834815342582, 54.65385755942889), (-9.240147148276744, 56.26952433784747), (-23.055121143177697, 54.00093589561959), (-21.95053906691765, 47.274386304376705), (-17.59826945789091, 51.626655913403454), align=None)
    extrude(amount=WYTNIJ_WYCI_GNI_CIE4_DEPTH, mode=Mode.SUBTRACT)

    # Szkic4 → Dodanie-wyciągnięcie4 (add)
    with BuildSketch(Plane(origin=(0, 0, -54.6538575594289), x_dir=(-1, 0, 0), z_dir=(0, 0, -1))):
        Circle(SZKIC4_R)
    extrude(amount=DODANIE_WYCI_GNI_CIE4_DEPTH)

    # Szkic5 → Dodanie-wyciągnięcie5 (add)
    with BuildSketch(Plane(origin=(-34.6124626856472, 0, -34.61246268564717), x_dir=(-0.7071067811865475, 0, 0.7071067811865477), z_dir=(-0.7071067811865477, 0, -0.7071067811865475))):
        Circle(SZKIC5_R)
    extrude(amount=DODANIE_WYCI_GNI_CIE5_DEPTH)

    # Szkic6 → Wytnij-wyciągnięcie5 (cut)
    with BuildSketch(Plane.XZ.offset(8)):
        Polygon((7.635842149160336, -43.65385755942889), (13.165024277111744, -17.499999999999996), (-7.248737341529154, -17.5), (-21.380397649888803, -3.3683396916403576), (-32.335886609702584, -21.332689575487763), (-10.01471862576144, -43.65385755942889), align=None)
    extrude(amount=-WYTNIJ_WYCI_GNI_CIE5_DEPTH, mode=Mode.SUBTRACT)

    # Zaokrąglenie1
    zaokr_glenie1_edges = [part.edges().sort_by_distance(p)[0] for p in [
        (7.635842149160336, -6.5, -43.65385755942889),
        (-10.01471862576144, -6.5, -43.65385755942889),
        (-32.335886609702584, -6.5, -21.332689575487763),
        (-21.380397649888803, -6.5, -3.3683396916403576),
        (-7.248737341529154, -6.5, -17.5),
        (13.165024277111744, -6.5, -17.499999999999996),
        (-12.499999999999995, -10, -49.6538575594289),
        (6.033730693913451, 10, -49.6538575594289),
        (-20.953164090141588, 10, -41.20069346928731),
        (6.09620329117756, 6.5, -18.417227773461114),
        (0.9667649489300165, 8.5, -49.6538575594289),
        (-11.665906130837973, 6.5, -15.500471204882405),
    ]]
    fillet(zaokr_glenie1_edges, radius=ZAOKR_GLENIE1_R)

    # Zaokrąglenie2
    zaokr_glenie2_edges = [part.edges().sort_by_distance(p)[0] for p in [
        (-18.144884891779377, 8, -24.099176343644537),
        (-22.41182088800963, 8, -36.667644697134236),
        (-33.19063523261732, 8, -28.96322232681158),
        (11.622076214271065, 8, -49.6538575594289),
        (8.91356978824917, 8, -32.11656368223886),
        (7.695163046353066, 8, -48.2430009983481),
        (-26.793668209900048, -8, -35.360189349528845),
        (-12.373879479967972, -8, -49.34937568947405),
        (0.8284271247461916, -8, -49.6538575594289),
    ]]
    fillet(zaokr_glenie2_edges, radius=ZAOKR_GLENIE2_R - 0.0001)  # a hair under: the kernel refuses the full size

    # Zaokrąglenie3
    zaokr_glenie3_edges = [part.edges().sort_by_distance(p)[0] for p in [
        (7, 8.6e-16, -54.6538575594289),
        (-29.66271521734136, 8.6e-16, -39.56221015395302),
    ]]
    fillet(zaokr_glenie3_edges, radius=ZAOKR_GLENIE3_R)

    # Sfazowanie1
    sfazowanie1_edges = [part.edges().sort_by_distance(p)[0] for p in [
        (7, 8.6e-16, -74.6538575594289),
        (-43.804850841072316, 8.6e-16, -53.70434577768397),
        (6.57e-15, 8, -13),
    ]]
    chamfer(sfazowanie1_edges, length=SFAZOWANIE1_SIZE)


solid = part.part
